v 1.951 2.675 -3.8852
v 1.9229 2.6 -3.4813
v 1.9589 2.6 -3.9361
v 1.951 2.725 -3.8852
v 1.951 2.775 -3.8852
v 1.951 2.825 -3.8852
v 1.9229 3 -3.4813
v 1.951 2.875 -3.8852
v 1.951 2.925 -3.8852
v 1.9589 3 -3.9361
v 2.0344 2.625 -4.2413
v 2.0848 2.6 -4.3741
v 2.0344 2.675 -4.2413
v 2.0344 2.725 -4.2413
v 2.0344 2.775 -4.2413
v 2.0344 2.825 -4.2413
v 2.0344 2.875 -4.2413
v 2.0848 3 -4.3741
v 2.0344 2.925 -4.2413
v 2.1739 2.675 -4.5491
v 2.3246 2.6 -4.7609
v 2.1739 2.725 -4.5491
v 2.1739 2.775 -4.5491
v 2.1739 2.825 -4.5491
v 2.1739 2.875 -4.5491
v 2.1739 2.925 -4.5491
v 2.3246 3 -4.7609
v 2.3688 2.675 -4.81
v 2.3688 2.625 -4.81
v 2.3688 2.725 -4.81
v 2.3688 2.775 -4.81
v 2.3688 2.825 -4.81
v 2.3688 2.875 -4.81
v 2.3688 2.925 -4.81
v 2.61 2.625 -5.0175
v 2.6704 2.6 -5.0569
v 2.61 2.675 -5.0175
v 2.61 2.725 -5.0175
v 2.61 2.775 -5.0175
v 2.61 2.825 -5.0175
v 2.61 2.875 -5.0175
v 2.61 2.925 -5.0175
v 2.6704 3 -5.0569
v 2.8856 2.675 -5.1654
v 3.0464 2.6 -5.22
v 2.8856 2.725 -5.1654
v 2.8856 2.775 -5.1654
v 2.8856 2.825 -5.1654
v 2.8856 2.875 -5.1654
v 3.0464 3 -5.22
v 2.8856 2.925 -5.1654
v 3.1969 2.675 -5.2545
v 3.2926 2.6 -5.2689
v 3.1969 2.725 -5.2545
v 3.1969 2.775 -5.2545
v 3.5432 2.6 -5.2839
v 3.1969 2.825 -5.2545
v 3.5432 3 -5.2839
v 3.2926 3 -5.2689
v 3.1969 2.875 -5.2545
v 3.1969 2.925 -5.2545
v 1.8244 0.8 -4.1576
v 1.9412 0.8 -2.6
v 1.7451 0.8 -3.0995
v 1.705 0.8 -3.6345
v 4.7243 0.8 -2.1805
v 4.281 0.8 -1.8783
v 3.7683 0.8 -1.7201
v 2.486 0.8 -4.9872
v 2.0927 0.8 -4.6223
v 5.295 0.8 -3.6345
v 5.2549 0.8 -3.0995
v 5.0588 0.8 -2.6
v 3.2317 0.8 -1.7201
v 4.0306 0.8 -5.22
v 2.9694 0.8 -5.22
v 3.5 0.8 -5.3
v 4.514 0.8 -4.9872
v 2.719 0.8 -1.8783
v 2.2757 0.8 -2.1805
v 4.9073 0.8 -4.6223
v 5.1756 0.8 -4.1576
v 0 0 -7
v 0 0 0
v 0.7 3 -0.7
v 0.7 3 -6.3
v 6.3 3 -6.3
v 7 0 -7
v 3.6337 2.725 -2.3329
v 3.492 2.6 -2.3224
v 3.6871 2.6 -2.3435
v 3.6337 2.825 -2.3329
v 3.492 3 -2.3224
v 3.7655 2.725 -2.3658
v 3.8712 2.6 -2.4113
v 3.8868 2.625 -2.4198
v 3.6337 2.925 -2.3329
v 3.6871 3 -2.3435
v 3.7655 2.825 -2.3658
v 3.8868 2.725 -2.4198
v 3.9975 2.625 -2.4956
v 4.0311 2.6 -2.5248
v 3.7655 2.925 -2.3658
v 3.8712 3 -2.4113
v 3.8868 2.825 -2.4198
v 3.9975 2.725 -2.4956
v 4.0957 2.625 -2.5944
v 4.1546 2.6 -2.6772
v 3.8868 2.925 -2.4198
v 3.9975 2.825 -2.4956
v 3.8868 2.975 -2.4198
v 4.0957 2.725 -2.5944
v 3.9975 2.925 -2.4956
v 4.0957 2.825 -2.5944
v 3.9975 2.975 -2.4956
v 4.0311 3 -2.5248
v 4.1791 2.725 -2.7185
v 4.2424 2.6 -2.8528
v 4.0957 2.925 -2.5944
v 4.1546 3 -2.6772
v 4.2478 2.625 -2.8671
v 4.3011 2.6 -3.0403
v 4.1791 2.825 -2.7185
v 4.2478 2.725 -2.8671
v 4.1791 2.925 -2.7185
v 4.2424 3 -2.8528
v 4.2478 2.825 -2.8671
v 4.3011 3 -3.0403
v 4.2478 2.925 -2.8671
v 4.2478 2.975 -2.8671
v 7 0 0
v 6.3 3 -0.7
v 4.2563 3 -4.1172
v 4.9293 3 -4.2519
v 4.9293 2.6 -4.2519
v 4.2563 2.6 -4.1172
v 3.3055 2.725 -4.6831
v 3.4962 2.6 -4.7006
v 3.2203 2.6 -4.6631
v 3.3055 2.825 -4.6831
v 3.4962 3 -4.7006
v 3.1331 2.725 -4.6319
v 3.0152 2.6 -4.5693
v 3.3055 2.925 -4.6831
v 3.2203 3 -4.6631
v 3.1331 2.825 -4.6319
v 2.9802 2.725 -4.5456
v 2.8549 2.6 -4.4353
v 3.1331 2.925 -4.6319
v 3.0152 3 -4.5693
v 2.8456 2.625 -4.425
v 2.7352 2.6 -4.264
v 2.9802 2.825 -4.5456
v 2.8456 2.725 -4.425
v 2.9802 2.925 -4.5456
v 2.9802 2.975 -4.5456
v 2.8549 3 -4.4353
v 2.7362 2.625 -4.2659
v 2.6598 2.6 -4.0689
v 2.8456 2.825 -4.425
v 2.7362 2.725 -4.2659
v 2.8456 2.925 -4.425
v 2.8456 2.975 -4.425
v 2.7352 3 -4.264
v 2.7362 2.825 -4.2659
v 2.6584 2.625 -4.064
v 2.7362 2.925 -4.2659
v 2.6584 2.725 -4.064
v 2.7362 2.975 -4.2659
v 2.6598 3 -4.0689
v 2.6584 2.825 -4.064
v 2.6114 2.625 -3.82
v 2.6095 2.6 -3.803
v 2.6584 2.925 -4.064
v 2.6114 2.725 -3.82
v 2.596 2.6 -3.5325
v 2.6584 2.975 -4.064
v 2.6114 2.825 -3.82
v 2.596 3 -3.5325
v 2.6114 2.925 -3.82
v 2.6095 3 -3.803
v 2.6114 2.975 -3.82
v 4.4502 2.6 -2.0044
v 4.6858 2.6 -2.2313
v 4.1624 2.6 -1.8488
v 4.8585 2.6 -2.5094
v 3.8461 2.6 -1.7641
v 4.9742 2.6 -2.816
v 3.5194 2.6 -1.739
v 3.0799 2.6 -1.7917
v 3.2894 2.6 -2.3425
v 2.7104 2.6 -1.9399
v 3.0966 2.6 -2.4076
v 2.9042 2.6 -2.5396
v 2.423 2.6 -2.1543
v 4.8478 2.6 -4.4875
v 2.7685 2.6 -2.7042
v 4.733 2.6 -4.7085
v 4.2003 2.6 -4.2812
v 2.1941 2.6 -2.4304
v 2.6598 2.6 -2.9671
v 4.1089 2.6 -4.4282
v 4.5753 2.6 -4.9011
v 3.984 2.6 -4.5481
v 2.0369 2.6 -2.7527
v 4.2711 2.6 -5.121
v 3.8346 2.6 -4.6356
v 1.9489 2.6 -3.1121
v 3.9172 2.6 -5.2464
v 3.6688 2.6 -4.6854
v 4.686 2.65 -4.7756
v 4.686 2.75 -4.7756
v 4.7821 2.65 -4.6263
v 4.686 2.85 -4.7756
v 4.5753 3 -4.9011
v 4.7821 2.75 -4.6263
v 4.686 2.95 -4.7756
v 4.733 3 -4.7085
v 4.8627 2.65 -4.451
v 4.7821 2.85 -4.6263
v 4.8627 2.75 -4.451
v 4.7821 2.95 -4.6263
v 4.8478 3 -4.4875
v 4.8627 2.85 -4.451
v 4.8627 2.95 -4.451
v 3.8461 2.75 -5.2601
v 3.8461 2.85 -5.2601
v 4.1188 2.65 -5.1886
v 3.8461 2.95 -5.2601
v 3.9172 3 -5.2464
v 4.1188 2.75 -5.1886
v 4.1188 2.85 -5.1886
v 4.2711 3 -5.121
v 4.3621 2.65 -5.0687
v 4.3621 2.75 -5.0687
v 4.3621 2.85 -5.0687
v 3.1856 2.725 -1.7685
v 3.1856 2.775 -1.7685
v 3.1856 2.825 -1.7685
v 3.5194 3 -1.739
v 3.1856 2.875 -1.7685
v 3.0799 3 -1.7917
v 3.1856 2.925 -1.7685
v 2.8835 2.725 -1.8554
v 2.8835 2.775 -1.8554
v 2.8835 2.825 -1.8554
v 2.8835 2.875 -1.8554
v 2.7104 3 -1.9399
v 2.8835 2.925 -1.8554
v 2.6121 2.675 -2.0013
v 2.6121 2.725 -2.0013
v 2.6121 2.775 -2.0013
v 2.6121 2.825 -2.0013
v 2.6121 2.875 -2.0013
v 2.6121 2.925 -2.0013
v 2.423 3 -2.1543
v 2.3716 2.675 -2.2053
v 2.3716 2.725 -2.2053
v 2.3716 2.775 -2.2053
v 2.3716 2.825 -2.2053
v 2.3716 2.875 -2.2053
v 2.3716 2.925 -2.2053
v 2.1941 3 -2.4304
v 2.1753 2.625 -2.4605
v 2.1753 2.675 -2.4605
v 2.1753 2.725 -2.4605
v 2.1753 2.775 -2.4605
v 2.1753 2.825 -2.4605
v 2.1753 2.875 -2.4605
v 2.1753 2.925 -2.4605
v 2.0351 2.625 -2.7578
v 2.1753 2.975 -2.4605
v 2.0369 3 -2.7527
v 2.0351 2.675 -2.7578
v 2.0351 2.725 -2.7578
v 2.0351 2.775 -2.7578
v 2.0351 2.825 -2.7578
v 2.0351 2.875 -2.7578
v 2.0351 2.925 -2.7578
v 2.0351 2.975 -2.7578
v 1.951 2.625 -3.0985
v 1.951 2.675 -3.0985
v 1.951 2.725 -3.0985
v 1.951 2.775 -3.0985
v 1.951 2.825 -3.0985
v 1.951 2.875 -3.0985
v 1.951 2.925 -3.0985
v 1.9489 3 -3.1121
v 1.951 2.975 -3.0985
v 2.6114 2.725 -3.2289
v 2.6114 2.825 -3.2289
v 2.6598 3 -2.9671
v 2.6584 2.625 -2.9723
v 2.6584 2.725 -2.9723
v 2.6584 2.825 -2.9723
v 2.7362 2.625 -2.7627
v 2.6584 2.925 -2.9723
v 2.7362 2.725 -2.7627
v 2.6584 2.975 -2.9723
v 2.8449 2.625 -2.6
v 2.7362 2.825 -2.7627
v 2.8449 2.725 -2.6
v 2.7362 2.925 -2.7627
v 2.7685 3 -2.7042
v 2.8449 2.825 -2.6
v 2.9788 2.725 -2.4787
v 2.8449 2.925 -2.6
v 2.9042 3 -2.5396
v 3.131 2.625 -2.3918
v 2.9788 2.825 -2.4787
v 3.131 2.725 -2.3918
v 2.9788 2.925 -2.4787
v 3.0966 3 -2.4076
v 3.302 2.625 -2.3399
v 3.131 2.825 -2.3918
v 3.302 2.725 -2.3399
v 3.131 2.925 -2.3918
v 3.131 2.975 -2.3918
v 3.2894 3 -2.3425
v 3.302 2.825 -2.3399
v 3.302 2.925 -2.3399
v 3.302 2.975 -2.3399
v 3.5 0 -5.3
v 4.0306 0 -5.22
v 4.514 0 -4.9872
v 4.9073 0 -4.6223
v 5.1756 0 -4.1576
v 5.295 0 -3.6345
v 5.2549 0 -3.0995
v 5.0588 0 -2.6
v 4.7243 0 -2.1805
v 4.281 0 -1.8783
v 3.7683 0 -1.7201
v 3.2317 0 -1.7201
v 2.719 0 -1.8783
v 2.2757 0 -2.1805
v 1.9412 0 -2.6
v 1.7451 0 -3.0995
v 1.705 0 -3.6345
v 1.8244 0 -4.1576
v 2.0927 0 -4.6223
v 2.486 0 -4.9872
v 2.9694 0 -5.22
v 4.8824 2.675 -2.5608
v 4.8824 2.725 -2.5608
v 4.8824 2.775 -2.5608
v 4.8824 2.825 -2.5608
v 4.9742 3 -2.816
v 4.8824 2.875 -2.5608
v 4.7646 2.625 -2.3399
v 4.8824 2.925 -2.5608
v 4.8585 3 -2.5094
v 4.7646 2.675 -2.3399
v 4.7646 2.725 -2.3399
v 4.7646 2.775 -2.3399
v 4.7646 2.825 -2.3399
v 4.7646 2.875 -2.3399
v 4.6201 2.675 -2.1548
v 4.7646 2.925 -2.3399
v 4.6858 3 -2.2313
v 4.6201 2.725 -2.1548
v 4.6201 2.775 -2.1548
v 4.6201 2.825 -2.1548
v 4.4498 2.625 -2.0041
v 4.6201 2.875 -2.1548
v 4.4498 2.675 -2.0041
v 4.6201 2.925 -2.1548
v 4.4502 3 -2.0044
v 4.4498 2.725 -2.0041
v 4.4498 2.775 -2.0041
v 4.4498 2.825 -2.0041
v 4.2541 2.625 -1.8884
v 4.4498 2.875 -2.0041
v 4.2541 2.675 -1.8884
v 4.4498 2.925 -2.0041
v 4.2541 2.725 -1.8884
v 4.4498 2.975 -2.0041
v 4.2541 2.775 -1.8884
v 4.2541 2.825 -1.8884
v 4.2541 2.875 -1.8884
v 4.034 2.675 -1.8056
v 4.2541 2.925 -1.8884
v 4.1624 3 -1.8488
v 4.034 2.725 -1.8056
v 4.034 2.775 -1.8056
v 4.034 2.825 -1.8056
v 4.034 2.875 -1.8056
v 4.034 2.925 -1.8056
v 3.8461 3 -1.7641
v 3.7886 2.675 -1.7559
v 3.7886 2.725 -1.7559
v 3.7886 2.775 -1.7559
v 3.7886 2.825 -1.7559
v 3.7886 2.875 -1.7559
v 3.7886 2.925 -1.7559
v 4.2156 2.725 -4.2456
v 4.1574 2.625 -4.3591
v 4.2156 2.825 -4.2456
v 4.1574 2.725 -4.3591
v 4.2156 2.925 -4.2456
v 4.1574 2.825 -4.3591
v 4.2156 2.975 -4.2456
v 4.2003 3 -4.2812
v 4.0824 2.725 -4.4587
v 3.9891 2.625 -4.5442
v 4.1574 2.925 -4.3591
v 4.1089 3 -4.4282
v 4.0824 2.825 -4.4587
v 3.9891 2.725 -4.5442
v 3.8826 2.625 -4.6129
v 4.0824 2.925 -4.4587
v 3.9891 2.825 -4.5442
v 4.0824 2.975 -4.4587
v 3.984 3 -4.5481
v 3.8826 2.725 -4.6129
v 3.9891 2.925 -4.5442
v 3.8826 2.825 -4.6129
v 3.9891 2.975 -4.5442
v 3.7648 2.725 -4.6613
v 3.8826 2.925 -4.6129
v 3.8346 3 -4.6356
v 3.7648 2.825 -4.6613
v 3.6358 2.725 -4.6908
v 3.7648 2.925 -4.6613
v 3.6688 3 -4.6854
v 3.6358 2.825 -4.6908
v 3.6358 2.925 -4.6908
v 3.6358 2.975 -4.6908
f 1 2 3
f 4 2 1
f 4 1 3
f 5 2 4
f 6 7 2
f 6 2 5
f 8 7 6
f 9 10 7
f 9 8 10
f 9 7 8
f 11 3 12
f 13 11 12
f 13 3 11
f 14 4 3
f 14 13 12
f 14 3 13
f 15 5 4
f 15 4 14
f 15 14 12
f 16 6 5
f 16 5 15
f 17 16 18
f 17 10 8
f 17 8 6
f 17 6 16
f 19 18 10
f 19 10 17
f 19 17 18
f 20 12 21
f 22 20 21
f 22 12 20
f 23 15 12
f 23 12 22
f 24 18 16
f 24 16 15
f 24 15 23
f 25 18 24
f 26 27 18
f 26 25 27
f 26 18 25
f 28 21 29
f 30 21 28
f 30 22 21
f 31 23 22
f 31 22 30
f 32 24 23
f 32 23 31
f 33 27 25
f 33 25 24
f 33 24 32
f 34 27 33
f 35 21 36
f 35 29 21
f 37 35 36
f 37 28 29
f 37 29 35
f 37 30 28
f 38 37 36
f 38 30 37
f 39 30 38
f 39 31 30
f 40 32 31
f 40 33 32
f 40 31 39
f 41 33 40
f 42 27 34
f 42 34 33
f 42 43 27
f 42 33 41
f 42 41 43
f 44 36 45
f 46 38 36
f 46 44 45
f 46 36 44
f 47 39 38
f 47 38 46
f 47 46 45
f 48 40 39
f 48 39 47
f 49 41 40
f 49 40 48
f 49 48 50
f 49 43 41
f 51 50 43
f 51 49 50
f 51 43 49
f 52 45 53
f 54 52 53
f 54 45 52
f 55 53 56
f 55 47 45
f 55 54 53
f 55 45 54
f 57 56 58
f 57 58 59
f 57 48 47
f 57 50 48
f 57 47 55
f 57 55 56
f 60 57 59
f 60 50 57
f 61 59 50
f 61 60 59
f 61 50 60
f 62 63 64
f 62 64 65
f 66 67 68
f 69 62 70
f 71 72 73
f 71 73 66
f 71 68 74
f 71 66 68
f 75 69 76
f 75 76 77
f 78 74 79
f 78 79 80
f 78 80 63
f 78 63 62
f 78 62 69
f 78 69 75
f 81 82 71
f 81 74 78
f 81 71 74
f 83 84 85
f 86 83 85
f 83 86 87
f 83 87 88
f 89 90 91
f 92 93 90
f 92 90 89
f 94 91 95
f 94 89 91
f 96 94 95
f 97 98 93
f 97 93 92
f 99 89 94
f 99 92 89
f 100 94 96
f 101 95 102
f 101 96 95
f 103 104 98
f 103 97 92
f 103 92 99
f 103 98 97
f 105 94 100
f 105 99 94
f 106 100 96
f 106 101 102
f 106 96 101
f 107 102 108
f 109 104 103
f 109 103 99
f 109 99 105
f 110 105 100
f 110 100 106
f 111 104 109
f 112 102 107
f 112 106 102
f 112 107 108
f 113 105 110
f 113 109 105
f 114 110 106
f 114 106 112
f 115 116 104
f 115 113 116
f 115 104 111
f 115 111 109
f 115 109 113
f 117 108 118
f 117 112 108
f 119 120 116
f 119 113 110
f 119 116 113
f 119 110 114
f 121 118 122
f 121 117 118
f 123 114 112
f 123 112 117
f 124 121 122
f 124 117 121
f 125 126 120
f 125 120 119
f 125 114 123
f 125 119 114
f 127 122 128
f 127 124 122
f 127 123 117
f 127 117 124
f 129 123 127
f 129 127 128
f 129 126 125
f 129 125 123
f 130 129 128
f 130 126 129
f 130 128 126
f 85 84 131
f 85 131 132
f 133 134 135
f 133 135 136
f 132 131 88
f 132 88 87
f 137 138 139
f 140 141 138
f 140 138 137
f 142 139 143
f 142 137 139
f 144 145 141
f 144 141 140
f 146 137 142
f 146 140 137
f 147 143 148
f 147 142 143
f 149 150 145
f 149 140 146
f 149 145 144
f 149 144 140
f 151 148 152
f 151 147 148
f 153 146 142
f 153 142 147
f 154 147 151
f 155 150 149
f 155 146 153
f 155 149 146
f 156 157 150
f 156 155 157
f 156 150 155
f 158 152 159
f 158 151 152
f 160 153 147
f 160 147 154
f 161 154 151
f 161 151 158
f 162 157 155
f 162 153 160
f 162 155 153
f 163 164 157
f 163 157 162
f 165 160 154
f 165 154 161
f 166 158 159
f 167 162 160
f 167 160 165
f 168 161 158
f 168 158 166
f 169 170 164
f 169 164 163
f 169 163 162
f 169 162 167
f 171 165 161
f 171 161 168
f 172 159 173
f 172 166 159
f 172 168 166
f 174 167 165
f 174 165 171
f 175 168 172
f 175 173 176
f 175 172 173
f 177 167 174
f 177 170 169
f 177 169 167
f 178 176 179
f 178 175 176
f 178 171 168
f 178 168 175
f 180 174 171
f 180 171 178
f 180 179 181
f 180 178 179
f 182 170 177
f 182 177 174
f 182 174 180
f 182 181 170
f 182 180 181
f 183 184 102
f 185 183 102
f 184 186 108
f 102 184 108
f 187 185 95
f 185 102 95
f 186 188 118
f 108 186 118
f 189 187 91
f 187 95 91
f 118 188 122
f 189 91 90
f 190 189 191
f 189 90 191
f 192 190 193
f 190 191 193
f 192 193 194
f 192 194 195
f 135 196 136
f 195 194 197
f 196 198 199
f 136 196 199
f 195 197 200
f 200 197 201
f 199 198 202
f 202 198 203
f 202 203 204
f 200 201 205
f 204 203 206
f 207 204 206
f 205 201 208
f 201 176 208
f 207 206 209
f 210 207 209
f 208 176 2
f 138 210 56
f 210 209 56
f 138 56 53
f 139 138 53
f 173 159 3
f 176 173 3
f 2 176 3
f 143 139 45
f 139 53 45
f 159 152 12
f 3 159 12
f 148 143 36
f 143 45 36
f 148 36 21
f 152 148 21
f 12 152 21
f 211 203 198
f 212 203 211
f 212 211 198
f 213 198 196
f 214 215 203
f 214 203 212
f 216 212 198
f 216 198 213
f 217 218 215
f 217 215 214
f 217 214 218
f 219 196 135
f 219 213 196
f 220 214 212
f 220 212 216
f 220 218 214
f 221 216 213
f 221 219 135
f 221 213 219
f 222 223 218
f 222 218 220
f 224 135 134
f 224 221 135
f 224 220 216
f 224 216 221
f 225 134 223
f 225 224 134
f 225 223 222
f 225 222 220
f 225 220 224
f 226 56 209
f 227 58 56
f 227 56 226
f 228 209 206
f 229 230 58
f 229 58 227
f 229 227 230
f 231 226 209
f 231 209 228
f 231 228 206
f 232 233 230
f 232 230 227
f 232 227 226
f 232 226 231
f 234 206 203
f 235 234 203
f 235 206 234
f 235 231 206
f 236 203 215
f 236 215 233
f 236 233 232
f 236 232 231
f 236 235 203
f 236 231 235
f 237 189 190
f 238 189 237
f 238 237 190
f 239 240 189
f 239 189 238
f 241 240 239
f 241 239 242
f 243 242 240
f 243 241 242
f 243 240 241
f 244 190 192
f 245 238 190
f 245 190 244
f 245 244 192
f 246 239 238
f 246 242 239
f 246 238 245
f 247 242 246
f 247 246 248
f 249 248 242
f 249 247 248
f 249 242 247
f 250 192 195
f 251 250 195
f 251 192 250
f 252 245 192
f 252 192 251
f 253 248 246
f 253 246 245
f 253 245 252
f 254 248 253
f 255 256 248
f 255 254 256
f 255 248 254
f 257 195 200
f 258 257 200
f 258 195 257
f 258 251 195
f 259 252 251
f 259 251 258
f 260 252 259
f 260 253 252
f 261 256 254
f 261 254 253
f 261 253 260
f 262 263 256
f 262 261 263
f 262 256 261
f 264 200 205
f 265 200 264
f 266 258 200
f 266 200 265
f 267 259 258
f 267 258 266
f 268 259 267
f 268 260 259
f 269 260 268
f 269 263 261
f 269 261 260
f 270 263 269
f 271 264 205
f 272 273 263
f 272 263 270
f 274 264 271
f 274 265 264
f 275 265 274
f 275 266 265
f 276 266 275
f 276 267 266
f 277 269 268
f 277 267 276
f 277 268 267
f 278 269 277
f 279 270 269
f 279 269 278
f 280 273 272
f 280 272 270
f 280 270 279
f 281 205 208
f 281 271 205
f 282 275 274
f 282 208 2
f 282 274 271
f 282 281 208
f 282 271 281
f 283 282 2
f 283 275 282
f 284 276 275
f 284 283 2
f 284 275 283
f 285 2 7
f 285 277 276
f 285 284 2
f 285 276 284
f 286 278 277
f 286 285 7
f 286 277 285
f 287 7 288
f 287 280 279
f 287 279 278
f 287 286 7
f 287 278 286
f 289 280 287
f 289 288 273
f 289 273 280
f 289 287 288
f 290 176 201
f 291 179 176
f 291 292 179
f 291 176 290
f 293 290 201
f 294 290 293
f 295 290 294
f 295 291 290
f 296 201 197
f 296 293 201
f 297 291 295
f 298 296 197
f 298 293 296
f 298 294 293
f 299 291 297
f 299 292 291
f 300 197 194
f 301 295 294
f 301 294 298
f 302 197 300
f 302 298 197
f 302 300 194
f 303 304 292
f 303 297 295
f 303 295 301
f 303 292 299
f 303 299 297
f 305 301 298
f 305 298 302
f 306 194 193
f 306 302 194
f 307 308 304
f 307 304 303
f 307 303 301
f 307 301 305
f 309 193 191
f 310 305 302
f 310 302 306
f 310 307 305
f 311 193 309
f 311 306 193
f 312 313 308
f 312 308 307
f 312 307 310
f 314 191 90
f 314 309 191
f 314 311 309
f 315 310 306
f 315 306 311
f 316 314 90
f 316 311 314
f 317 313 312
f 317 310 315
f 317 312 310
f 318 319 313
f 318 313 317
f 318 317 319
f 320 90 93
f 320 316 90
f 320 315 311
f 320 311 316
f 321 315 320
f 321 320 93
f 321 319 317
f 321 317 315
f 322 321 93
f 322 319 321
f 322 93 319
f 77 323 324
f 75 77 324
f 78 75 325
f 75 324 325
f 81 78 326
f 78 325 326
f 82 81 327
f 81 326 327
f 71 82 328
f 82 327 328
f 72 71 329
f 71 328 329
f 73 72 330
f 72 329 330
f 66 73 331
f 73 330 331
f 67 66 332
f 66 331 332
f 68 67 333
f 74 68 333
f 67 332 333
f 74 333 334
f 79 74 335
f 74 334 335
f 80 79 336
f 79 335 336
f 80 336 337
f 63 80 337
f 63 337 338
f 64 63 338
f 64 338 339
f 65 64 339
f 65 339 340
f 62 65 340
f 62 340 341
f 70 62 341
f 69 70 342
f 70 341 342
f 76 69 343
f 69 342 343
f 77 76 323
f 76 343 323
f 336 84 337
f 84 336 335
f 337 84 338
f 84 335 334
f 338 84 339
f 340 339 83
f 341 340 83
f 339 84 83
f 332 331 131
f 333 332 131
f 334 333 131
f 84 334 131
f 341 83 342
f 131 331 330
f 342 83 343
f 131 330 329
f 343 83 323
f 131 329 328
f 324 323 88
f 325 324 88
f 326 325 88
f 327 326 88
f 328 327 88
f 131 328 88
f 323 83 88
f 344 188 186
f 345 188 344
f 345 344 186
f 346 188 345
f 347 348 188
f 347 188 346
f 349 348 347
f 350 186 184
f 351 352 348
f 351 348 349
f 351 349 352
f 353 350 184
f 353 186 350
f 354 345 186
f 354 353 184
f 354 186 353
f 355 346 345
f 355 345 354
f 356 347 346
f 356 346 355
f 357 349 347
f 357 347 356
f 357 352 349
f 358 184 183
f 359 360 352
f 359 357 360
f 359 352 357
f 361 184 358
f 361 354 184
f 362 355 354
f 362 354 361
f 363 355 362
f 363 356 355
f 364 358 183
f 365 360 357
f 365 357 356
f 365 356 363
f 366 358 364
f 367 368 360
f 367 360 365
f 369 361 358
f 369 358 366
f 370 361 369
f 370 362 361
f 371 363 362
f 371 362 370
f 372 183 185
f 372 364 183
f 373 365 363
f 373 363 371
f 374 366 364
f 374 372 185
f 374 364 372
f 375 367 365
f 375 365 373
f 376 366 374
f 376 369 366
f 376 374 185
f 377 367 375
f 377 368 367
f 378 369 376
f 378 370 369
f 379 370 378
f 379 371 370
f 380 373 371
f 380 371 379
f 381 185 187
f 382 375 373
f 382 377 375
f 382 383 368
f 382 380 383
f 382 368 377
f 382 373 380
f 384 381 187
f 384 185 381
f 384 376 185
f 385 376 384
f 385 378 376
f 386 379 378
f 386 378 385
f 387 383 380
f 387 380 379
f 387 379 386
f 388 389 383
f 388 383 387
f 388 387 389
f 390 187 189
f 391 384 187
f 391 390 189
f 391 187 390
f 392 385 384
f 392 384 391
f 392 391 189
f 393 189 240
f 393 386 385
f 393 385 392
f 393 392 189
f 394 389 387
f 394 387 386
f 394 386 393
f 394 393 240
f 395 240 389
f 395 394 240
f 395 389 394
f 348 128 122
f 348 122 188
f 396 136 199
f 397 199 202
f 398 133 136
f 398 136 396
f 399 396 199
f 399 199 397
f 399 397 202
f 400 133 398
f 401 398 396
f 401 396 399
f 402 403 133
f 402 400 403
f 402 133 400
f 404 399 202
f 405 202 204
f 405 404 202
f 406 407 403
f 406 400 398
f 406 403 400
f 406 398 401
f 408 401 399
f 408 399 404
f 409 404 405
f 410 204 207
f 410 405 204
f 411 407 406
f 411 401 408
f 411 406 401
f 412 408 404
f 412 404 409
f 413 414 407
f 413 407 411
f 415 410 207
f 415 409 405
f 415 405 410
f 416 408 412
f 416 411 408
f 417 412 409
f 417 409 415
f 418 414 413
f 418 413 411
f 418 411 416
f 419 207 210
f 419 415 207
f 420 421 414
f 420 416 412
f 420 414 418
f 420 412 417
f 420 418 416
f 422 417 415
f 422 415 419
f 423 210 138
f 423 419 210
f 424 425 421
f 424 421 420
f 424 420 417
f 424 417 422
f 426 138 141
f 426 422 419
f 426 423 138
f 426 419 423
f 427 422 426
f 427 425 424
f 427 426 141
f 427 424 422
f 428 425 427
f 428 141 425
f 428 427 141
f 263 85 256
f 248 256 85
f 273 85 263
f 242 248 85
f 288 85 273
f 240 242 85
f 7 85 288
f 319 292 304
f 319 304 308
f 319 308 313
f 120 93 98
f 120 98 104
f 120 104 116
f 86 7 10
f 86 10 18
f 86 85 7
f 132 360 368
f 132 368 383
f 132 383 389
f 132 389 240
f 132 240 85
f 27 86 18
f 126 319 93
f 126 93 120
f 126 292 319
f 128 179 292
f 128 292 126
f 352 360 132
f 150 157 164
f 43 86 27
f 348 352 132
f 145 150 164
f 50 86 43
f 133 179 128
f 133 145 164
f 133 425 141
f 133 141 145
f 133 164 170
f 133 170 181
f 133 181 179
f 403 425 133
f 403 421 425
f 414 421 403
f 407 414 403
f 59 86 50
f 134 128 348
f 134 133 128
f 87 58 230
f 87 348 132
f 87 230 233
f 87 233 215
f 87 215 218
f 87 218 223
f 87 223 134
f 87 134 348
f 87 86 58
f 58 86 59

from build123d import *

# Parameters (mm, degrees)
SKETCH1_W           = 7
SKETCH1_H           = 7
BOSS_EXTRUDE1_DEPTH = 3
CUT_EXTRUDE1_DEPTH  = 7
CUT_EXTRUDE2_DEPTH  = 11
SKETCH4_R           = 1.8
CUT_EXTRUDE3_DEPTH  = 0.8
CUT_EXTRUDE4_DEPTH  = 0.4


with BuildPart() as part:
    # Sketch1 → Boss-Extrude1 (new body)
    with BuildSketch(Plane(origin=(0, 0, 0), x_dir=(1, 0, 0), z_dir=(0, 1, 0))):
        with Locations((3.5, 3.5)):
            Rectangle(SKETCH1_W, SKETCH1_H)
    extrude(amount=BOSS_EXTRUDE1_DEPTH)

    # Sketch2 → Cut-Extrude1 (cut)
    with BuildSketch(Plane.XY):
        Polygon((0, 0), (0.7, 3), (0, 3), align=None)
        Polygon((7, 0), (6.3, 3), (7, 3), align=None)
    extrude(amount=-CUT_EXTRUDE1_DEPTH, mode=Mode.SUBTRACT)

    # Sketch3 → Cut-Extrude2 (cut)
    with BuildSketch(Plane(origin=(0, 0, 0), x_dir=(0, 0, -1), z_dir=(1, 0, 0))):
        Polygon((0, 0), (0.7, 3), (0, 3), align=None)
        Polygon((7, 3), (6.3, 3), (7, 0), align=None)
    extrude(amount=CUT_EXTRUDE2_DEPTH, mode=Mode.SUBTRACT)

    # Sketch4 → Cut-Extrude3 (cut)
    with BuildSketch(Plane.XZ):
        with Locations(Location((3.5, -3.5, 0), (0, 0, 270))):
            Circle(SKETCH4_R)
    extrude(amount=-CUT_EXTRUDE3_DEPTH, mode=Mode.SUBTRACT)

    # Sketch5 → Cut-Extrude4 (cut)
    with BuildSketch(Plane(origin=(0, 3, 0), x_dir=(1, 0, 0), z_dir=(0, 1, 0))):
        with BuildLine():
            Line((4.301123745, 3.0403235), (4.974200669, 2.815964526))
            add(Edge.make_bspline(
                [(4.974200669, 2.815964526), (4.960521674, 2.771832567), (4.933733899, 2.68540831), (4.884547054, 2.561541828), (4.828302659, 2.446749112), (4.767023387, 2.33968659), (4.696898403, 2.243120033), (4.621853673, 2.15385218), (4.53965782, 2.073763183), (4.45071642, 2.002682023), (4.355885584, 1.939823406), (4.25406375, 1.886683329), (4.146770466, 1.840915158), (4.032917717, 1.803833291), (3.913261107, 1.774136343), (3.787239198, 1.754521348), (3.655441508, 1.741221733), (3.565448152, 1.739779731), (3.519372944, 1.739041449)],
                knots=[0, 0, 0, 0, 1.126640671, 2.206316847, 3.246446654, 4.24268115, 5.210795778, 6.153057602, 7.084219323, 8.004711971, 8.926421631, 9.854560063, 10.802134612, 11.768317461, 12.772025444, 13.805668576, 14.876536225, 16, 16, 16, 16], degree=3))
            add(Edge.make_bspline(
                [(3.519372944, 1.739041449), (3.462502515, 1.740217406), (3.350636682, 1.742530549), (3.187043495, 1.765815525), (3.031146586, 1.80214564), (2.882722932, 1.852444053), (2.742763243, 1.919064174), (2.609990608, 1.999266162), (2.485371298, 2.094678249), (2.3693425, 2.203692372), (2.263927531, 2.325476328), (2.172770854, 2.459372031), (2.094880625, 2.603493215), (2.031925726, 2.758527068), (1.982699244, 2.924314395), (1.948215991, 3.100625971), (1.926638564, 3.287517332), (1.924180264, 3.415596421), (1.922918617, 3.481329109)],
                knots=[0, 0, 0, 0, 1.025049111, 2.016302254, 2.973197159, 3.90886983, 4.83646737, 5.763135642, 6.70136783, 7.661478232, 8.629732022, 9.600038443, 10.576877021, 11.5787097, 12.612181225, 13.690866959, 14.814907849, 16, 16, 16, 16], degree=3))
            add(Edge.make_bspline(
                [(1.922918617, 3.481329109), (1.924174578, 3.550566485), (1.926624727, 3.685635974), (1.948242577, 3.882015446), (1.981803001, 4.067091651), (2.031112683, 4.239717041), (2.09314245, 4.401106495), (2.171127245, 4.549657913), (2.261374638, 4.687351889), (2.366311182, 4.811664664), (2.482868768, 4.922037599), (2.607774637, 5.019637111), (2.74219405, 5.101516105), (2.885391432, 5.168472462), (3.037558838, 5.220286586), (3.198396842, 5.257596822), (3.368037039, 5.279313779), (3.484020884, 5.282359114), (3.543211085, 5.283913244)],
                knots=[0, 0, 0, 0, 1.212648312, 2.365655595, 3.457000981, 4.504219827, 5.506356588, 6.480637568, 7.437950897, 8.385265166, 9.323599949, 10.245787653, 11.157260172, 12.074946661, 13.00980897, 13.968233668, 14.963125779, 16, 16, 16, 16], degree=3))
            add(Edge.make_bspline(
                [(3.543211085, 5.283913244), (3.594904175, 5.282610712), (3.696255358, 5.280056925), (3.844673873, 5.262706402), (3.98533309, 5.232257393), (4.118993318, 5.191158002), (4.244893689, 5.136917739), (4.363259754, 5.070636697), (4.474498364, 4.992665569), (4.541521917, 4.931760883), (4.575262367, 4.901100744)],
                knots=[0, 0, 0, 0, 1.098510076, 2.153775193, 3.169777012, 4.153122333, 5.120892526, 6.076995459, 7.031936742, 8, 8, 8, 8], degree=3))
            add(Edge.make_bspline(
                [(4.575262367, 4.901100744), (4.594817889, 4.881591385), (4.634388278, 4.842114408), (4.687225854, 4.775466084), (4.73732244, 4.703719152), (4.783882904, 4.625649701), (4.825435673, 4.54066776), (4.863980304, 4.45007838), (4.8994669, 4.353532371), (4.919201528, 4.286342314), (4.929328874, 4.251861961)],
                knots=[0, 0, 0, 0, 0.885292881, 1.791380647, 2.722937556, 3.69093542, 4.703306561, 5.754477758, 6.847650944, 8, 8, 8, 8], degree=3))
            Line((4.929328874, 4.251861961), (4.256251951, 4.117246577))
            add(Edge.make_bspline(
                [(4.256251951, 4.117246577), (4.250531073, 4.139323539), (4.239262446, 4.182809362), (4.216461913, 4.245296102), (4.190307903, 4.304590437), (4.157892404, 4.359240043), (4.123458761, 4.411676126), (4.082691271, 4.459570361), (4.038193489, 4.504177952), (3.98964486, 4.545035979), (3.937624153, 4.581318844), (3.883132951, 4.61393488), (3.825180855, 4.640559757), (3.76453877, 4.66209922), (3.701448228, 4.680158437), (3.63534753, 4.691314457), (3.566804403, 4.699878675), (3.520103543, 4.700342739), (3.496235925, 4.70057991)],
                knots=[0, 0, 0, 0, 1.051226935, 2.070641259, 3.064374968, 4.034983734, 4.997599858, 5.953980297, 6.92954377, 7.901109626, 8.875958313, 9.851998019, 10.826131395, 11.811470594, 12.818270757, 13.847890818, 14.900111925, 16, 16, 16, 16], degree=3))
            add(Edge.make_bspline(
                [(3.496235925, 4.70057991), (3.463458178, 4.699917949), (3.399485824, 4.698625999), (3.305980427, 4.684221631), (3.216859157, 4.664118846), (3.132481433, 4.633421996), (3.053369786, 4.594160979), (2.978625107, 4.546434822), (2.908657635, 4.490447949), (2.843443721, 4.425537099), (2.784923098, 4.350528652), (2.733475117, 4.265267743), (2.690794404, 4.168786384), (2.656144454, 4.062031362), (2.628870995, 3.944748811), (2.609395598, 3.81678831), (2.598625118, 3.678062323), (2.596890981, 3.582075039), (2.59599554, 3.532511)],
                knots=[0, 0, 0, 0, 0.938194206, 1.831074359, 2.704771284, 3.551924377, 4.396294915, 5.230222094, 6.087631332, 6.958733431, 7.860107878, 8.806247581, 9.804197948, 10.875520245, 12.017191412, 13.250061517, 14.580040491, 16, 16, 16, 16], degree=3))
            add(Edge.make_bspline(
                [(2.59599554, 3.532511), (2.596882163, 3.479909852), (2.598590549, 3.378555543), (2.609358744, 3.232361327), (2.628958677, 3.097901323), (2.655869672, 2.974936912), (2.690694237, 2.863543412), (2.733302771, 2.763913587), (2.783956188, 2.675930758), (2.84257568, 2.599653514), (2.907679246, 2.534131595), (2.977503606, 2.477797664), (3.05163681, 2.429632374), (3.130524959, 2.39000508), (3.2144681, 2.360027472), (3.302776345, 2.338287186), (3.395773712, 2.32446654), (3.459494346, 2.323081807), (3.492029194, 2.322374782)],
                knots=[0, 0, 0, 0, 1.475208372, 2.842499301, 4.107722225, 5.282836115, 6.369007568, 7.375918121, 8.315702116, 9.208439171, 10.065831443, 10.90006451, 11.71996243, 12.54067204, 13.369972975, 14.214060185, 15.088124569, 16, 16, 16, 16], degree=3))
            add(Edge.make_bspline(
                [(3.492029194, 2.322374782), (3.516116809, 2.32297573), (3.563481527, 2.324157405), (3.633490233, 2.331657405), (3.700684312, 2.345970073), (3.765392659, 2.364895987), (3.827866687, 2.388642426), (3.887153461, 2.419104331), (3.944419425, 2.454115768), (3.998476353, 2.495146489), (4.050048096, 2.541211307), (4.097084586, 2.594450756), (4.140714836, 2.653585613), (4.180385329, 2.719011076), (4.217421584, 2.790167129), (4.248932218, 2.868162419), (4.278287198, 2.951736508), (4.293378607, 3.010278741), (4.301123745, 3.0403235)],
                knots=[0, 0, 0, 0, 0.980177776, 1.927374078, 2.859849964, 3.771585772, 4.668674471, 5.574490016, 6.479656464, 7.396337719, 8.332153134, 9.288470092, 10.28125149, 11.318486971, 12.398724812, 13.541284404, 14.738150009, 16, 16, 16, 16], degree=3))
        make_face()
    extrude(amount=-CUT_EXTRUDE4_DEPTH, mode=Mode.SUBTRACT)


solid = part.part
